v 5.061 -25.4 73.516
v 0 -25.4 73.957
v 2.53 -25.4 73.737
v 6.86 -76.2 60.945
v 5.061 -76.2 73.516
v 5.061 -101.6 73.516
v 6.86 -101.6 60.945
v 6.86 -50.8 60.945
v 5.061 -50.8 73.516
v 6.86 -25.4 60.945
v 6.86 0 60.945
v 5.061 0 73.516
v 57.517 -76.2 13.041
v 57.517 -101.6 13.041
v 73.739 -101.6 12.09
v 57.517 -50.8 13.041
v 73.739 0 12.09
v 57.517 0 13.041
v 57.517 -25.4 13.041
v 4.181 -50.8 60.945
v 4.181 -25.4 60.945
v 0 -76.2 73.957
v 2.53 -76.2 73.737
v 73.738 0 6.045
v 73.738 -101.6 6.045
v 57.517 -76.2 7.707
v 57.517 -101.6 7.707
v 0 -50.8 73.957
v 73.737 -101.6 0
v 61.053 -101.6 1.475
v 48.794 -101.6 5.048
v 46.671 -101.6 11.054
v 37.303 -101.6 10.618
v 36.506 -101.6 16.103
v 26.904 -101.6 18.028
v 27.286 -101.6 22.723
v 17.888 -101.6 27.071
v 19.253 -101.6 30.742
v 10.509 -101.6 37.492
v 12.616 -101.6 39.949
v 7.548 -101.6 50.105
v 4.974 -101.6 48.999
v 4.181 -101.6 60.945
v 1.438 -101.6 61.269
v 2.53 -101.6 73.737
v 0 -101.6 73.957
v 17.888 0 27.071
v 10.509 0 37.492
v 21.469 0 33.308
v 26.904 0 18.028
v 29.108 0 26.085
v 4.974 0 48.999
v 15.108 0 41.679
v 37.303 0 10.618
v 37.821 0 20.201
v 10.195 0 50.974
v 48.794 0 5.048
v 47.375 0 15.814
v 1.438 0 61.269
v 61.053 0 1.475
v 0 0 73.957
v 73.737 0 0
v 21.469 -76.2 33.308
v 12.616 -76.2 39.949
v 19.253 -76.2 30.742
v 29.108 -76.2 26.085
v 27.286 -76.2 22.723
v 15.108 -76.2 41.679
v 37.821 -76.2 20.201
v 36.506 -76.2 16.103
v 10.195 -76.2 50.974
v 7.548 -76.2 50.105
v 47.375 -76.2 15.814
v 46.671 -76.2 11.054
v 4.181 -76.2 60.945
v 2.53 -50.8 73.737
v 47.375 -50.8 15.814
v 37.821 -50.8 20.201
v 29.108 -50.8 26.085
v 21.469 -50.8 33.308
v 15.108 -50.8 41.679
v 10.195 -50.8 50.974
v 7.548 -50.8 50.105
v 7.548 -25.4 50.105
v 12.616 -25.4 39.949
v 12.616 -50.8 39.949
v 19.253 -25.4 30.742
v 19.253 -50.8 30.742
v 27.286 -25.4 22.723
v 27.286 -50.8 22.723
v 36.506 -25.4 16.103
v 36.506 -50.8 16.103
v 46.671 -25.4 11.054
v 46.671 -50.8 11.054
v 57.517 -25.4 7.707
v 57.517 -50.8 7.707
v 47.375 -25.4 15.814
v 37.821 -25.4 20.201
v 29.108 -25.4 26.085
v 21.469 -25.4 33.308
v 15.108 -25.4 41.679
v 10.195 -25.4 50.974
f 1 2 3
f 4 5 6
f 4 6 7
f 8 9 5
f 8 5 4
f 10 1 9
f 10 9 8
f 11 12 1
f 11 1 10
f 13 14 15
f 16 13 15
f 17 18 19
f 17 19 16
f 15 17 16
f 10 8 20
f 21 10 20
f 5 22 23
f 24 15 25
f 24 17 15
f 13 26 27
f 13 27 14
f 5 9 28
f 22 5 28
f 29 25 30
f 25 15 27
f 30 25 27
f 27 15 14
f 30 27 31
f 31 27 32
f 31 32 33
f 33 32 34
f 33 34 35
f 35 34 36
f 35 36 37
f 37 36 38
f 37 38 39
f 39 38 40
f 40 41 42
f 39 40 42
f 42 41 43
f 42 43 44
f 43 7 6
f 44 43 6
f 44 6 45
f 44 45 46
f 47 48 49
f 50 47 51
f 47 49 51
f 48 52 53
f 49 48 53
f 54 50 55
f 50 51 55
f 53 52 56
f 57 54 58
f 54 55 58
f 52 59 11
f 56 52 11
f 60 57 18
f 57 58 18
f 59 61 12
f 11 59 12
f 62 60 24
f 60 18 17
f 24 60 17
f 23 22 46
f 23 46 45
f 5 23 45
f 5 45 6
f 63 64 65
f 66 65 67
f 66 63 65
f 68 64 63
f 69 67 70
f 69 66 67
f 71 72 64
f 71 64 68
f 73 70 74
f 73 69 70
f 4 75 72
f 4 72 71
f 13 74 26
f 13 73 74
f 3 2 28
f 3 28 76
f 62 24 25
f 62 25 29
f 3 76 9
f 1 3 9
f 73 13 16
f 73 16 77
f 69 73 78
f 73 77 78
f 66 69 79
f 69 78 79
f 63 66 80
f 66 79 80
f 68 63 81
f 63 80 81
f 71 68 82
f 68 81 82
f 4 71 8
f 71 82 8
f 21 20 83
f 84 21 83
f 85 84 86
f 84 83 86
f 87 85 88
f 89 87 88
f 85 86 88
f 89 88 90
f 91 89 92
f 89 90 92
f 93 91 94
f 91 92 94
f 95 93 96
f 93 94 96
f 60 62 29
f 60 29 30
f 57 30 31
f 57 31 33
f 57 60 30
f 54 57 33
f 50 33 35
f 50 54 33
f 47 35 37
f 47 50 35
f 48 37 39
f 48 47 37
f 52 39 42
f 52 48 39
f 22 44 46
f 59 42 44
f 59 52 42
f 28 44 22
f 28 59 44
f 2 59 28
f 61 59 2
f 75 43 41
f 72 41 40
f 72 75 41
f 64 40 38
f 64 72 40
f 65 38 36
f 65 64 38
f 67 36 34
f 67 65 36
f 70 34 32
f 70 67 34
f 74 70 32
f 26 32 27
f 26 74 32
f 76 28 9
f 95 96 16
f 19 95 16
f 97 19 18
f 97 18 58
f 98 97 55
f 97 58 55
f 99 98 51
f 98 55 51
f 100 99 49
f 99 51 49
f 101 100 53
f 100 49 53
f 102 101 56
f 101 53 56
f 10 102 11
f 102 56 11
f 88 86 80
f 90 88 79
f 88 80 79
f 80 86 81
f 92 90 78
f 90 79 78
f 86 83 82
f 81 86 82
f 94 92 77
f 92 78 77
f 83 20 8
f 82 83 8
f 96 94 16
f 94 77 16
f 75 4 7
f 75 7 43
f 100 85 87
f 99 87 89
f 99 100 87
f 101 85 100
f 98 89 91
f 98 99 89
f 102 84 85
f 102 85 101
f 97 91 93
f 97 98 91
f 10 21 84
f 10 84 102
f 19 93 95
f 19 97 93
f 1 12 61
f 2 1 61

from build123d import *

# Parameters (mm, degrees)
F1_DEPTH = 76.2
F2_DEPTH = 50.8
F4_DEPTH = 50.8
F5_DEPTH = 25.4
F6_DEPTH = 50.8


with BuildPart() as f1:
    # F0 (on Front) → F1 (new body)
    with BuildSketch(Plane.XZ):
        with BuildLine():
            Line((5.060865, 73.516467), (0, 73.956974))
            ThreePointArc((0, 73.956974), (22.2398, 22.393389), (73.736869, 0))
            Line((73.736869, 0), (73.738756, 12.0904))
            ThreePointArc((73.738756, 12.0904), (26.455464, 28.330906), (5.060865, 73.516467))
        make_face()
    extrude(amount=F1_DEPTH)

    # F0 (on Front) → F2 (cut)
    with BuildSketch(Plane.XZ):
        with BuildLine():
            Line((5.060865, 73.516467), (0, 73.956974))
            ThreePointArc((0, 73.956974), (22.2398, 22.393389), (73.736869, 0))
            Line((73.736869, 0), (73.738756, 12.0904))
            ThreePointArc((73.738756, 12.0904), (26.455464, 28.330906), (5.060865, 73.516467))
        make_face()
    extrude(amount=F2_DEPTH, mode=Mode.SUBTRACT)

    # F3 (on face) → F4 (join)
    with BuildSketch(Plane(origin=(0, -50.8, 0), x_dir=(-1, 0, 0), z_dir=(0, 1, 0))):
        with BuildLine():
            Line((-73.738756, 12.0904), (-73.737813, 6.0452))
            ThreePointArc((-73.737813, 6.0452), (-65.578858, 6.40406), (-57.516672, 7.707316))
            Line((-57.516672, 7.707316), (-57.516672, 13.041316))
            Line((-57.516672, 13.041316), (-73.738756, 12.0904))
        make_face()
        with BuildLine():
            ThreePointArc((-57.516672, 7.707316), (-65.578858, 6.40406), (-73.737813, 6.0452))
            Line((-73.737813, 6.0452), (-73.736869, 0))
            ThreePointArc((-73.736869, 0), (-22.206337, 22.360026), (0, 73.956974))
            Line((0, 73.956974), (-2.530432, 73.73672))
            ThreePointArc((-2.530432, 73.73672), (-3.061646, 67.302687), (-4.181222, 60.94458))
            ThreePointArc((-4.181222, 60.94458), (-23.10727, 26.569993), (-57.516672, 7.707316))
        make_face()
        with BuildLine():
            Line((-6.860218, 60.94458), (-4.181222, 60.94458))
            ThreePointArc((-4.181222, 60.94458), (-3.061646, 67.302687), (-2.530432, 73.73672))
            Line((-2.530432, 73.73672), (-5.060865, 73.516467))
            Line((-5.060865, 73.516467), (-6.860218, 60.94458))
        make_face()
    extrude(amount=F4_DEPTH)

    # F0 (on Front) → F5 (join)
    with BuildSketch(Plane.XZ):
        with BuildLine():
            Line((5.060865, 73.516467), (0, 73.956974))
            ThreePointArc((0, 73.956974), (22.2398, 22.393389), (73.736869, 0))
            Line((73.736869, 0), (73.738756, 12.0904))
            ThreePointArc((73.738756, 12.0904), (26.455464, 28.330906), (5.060865, 73.516467))
        make_face()
    extrude(amount=F5_DEPTH)

    # F3 (on face) → F6 (join)
    with BuildSketch(Plane(origin=(0, -50.8, 0), x_dir=(-1, 0, 0), z_dir=(0, 1, 0))):
        with BuildLine():
            Line((-73.738756, 12.0904), (-73.737813, 6.0452))
            ThreePointArc((-73.737813, 6.0452), (-65.578858, 6.40406), (-57.516672, 7.707316))
            Line((-57.516672, 7.707316), (-57.516672, 13.041316))
            Line((-57.516672, 13.041316), (-73.738756, 12.0904))
        make_face()
        with BuildLine():
            ThreePointArc((-57.516672, 7.707316), (-65.578858, 6.40406), (-73.737813, 6.0452))
            Line((-73.737813, 6.0452), (-73.736869, 0))
            ThreePointArc((-73.736869, 0), (-22.206337, 22.360026), (0, 73.956974))
            Line((0, 73.956974), (-2.530432, 73.73672))
            ThreePointArc((-2.530432, 73.73672), (-3.061646, 67.302687), (-4.181222, 60.94458))
            ThreePointArc((-4.181222, 60.94458), (-23.10727, 26.569993), (-57.516672, 7.707316))
        make_face()
        with BuildLine():
            Line((-6.860218, 60.94458), (-4.181222, 60.94458))
            ThreePointArc((-4.181222, 60.94458), (-3.061646, 67.302687), (-2.530432, 73.73672))
            Line((-2.530432, 73.73672), (-5.060865, 73.516467))
            Line((-5.060865, 73.516467), (-6.860218, 60.94458))
        make_face()
    extrude(amount=-F6_DEPTH)


solid = f1.part
